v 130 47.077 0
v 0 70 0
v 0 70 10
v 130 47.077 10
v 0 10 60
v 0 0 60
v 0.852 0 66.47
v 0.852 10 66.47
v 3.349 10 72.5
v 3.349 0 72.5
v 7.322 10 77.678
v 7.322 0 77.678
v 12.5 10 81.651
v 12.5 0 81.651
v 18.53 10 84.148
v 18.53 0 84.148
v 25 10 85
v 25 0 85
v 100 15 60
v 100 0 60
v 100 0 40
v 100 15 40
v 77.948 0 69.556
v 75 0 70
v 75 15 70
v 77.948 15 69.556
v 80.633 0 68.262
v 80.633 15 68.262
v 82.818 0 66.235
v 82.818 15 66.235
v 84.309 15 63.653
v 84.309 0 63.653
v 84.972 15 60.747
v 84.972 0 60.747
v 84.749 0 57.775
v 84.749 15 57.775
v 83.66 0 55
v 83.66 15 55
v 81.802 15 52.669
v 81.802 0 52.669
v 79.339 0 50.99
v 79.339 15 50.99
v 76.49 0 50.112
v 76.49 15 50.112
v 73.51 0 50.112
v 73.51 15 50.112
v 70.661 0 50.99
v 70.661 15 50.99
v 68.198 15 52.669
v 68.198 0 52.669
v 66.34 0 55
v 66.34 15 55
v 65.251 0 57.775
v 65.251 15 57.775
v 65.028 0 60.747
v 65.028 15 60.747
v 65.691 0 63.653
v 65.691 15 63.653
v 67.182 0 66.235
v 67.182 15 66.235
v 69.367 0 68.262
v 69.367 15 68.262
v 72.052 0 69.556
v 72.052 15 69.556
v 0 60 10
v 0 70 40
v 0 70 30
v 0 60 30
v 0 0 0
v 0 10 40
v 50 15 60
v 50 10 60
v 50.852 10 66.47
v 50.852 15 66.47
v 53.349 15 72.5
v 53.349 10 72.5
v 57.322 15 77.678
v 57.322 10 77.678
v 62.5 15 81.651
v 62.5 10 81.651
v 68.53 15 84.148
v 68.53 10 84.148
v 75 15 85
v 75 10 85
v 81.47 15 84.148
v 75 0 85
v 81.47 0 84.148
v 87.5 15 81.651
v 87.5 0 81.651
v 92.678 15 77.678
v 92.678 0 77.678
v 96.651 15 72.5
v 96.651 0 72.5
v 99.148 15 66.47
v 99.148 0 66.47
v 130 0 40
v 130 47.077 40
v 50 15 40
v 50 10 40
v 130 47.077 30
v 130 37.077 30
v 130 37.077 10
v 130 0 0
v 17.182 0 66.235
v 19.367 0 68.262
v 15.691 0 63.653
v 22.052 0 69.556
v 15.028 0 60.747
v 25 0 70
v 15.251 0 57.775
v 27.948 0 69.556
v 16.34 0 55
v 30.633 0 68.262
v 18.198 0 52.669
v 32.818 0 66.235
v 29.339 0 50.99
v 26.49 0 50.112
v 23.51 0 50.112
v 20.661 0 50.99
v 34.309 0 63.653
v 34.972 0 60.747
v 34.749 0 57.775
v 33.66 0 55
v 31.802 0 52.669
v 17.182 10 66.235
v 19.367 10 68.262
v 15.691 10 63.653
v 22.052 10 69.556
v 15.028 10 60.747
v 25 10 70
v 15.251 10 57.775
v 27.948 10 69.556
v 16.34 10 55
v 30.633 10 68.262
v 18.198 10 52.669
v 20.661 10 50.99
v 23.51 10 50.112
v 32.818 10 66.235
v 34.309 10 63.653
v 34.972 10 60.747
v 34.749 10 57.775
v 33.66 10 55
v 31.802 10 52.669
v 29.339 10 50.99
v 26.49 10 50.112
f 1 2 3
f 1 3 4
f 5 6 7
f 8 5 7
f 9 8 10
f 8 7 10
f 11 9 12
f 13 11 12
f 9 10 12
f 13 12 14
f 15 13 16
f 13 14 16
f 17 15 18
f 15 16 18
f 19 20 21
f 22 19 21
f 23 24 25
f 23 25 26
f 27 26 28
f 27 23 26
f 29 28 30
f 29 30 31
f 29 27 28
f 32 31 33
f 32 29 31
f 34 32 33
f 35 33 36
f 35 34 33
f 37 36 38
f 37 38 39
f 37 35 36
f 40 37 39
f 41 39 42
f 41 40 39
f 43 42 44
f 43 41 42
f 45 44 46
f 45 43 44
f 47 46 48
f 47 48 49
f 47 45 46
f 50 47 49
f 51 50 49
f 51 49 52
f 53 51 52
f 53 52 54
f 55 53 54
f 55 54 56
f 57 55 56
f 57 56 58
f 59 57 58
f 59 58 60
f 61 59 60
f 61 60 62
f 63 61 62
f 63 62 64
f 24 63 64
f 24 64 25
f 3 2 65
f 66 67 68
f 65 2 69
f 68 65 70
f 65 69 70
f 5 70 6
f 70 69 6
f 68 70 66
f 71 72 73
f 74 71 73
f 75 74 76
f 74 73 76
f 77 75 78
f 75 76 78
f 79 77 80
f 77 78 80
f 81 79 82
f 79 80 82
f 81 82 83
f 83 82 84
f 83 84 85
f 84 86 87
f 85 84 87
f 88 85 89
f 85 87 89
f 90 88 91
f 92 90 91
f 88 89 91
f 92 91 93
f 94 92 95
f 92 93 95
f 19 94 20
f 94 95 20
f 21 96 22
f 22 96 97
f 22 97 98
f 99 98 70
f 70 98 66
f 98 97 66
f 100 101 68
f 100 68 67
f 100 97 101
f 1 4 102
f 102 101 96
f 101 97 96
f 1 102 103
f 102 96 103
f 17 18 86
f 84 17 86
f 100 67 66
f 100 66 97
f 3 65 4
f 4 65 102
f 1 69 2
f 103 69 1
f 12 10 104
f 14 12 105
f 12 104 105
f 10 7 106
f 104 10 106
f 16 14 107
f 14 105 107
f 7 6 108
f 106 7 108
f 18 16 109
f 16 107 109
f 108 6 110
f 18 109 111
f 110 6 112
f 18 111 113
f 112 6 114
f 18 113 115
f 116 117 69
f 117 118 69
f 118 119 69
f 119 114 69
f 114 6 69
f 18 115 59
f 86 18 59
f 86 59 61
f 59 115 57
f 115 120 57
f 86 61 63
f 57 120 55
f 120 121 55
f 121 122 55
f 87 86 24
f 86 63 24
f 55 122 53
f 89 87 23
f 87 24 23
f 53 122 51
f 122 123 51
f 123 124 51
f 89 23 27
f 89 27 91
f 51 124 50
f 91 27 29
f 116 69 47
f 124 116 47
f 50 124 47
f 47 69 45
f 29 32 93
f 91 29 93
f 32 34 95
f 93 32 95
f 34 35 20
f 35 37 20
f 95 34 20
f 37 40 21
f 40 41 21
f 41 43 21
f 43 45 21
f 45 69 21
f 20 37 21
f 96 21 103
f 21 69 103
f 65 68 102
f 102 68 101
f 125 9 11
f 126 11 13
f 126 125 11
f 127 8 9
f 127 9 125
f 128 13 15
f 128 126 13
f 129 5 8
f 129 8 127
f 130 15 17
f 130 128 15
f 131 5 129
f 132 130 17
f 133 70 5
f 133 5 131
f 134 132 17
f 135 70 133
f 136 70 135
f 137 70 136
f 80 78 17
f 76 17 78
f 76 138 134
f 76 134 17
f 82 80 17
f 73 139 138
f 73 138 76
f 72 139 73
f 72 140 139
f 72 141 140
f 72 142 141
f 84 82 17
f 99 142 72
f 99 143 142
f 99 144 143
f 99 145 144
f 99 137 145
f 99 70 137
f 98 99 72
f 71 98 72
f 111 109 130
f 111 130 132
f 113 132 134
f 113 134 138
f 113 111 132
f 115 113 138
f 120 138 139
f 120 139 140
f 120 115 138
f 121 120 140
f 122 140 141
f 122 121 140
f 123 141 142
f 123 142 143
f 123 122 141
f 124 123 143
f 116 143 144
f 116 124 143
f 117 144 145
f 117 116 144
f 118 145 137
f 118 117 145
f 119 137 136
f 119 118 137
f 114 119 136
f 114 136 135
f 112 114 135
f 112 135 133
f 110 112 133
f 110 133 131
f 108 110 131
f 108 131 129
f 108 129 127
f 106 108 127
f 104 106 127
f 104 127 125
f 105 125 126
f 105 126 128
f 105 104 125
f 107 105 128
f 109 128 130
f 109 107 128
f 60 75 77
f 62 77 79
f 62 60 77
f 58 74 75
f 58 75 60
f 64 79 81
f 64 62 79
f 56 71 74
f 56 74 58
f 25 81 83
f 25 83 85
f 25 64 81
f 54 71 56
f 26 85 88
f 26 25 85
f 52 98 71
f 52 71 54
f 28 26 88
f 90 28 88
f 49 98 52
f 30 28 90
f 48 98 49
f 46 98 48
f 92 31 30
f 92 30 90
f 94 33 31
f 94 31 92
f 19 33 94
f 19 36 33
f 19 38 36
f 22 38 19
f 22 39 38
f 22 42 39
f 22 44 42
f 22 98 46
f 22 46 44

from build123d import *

# Parameters (mm, degrees)
SKETCH_1_W               = 130
SKETCH_1_H               = 10
EXTRUDE_1_DEPTH          = 70
EXTRUDE_1_2_DEPTH        = 70
SKETCH_1_3_W             = 130
SKETCH_1_3_H             = 20
EXTRUDE_2_DEPTH          = 60
SKETCH_3_W               = 20
SKETCH_3_H               = 22.922507492
CUT_EXTRUDE_4_DEPTH      = 130
CUT_EXTRUDE_5_DEPTH      = 153.970585408
CUT_EXTRUDE_5_DEPTH_BACK = 153.970585408
EXTRUDE_3_DEPTH          = 30
SKETCH_1_4_R             = 10
EXTRUDE_4_DEPTH          = 10
SKETCH_1_5_R             = 10
EXTRUDE_5_DEPTH          = 15


with BuildPart() as part:
    # 스케치1 → 보스-돌출1 (new body)
    with BuildSketch(Plane(origin=(0, 0, 0), x_dir=(1, 0, 0), z_dir=(0, 1, 0))):
        with Locations((65, -5)):
            Rectangle(SKETCH_1_W, SKETCH_1_H)
    extrude(amount=EXTRUDE_1_DEPTH)



with BuildPart() as body_2:
    # 스케치1 → Extrude 1 2 (new body)
    with BuildSketch(Plane(origin=(0, 0, 0), x_dir=(1, 0, 0), z_dir=(0, 1, 0))):
        with Locations((65, -35)):
            Rectangle(SKETCH_1_W, SKETCH_1_H)
    extrude(amount=EXTRUDE_1_2_DEPTH)


with BuildPart() as part_1:
    add(part.part)

    add(body_2.part)  # 보스-돌출2 merges body 2
    # 스케치1<3> → 보스-돌출2 (add)
    with BuildSketch(Plane(origin=(0, 0, 0), x_dir=(1, 0, 0), z_dir=(0, 1, 0))):
        with Locations((65, -20)):
            Rectangle(SKETCH_1_3_W, SKETCH_1_3_H)
    extrude(amount=EXTRUDE_2_DEPTH)

    # 스케치3 → 컷-돌출4 (cut)
    with BuildSketch(Plane(origin=(130, 0, 0), x_dir=(0, 0, -1), z_dir=(1, 0, 0))):
        with Locations((-20, 48.538746254)):
            Rectangle(SKETCH_3_W, SKETCH_3_H)
    extrude(amount=-CUT_EXTRUDE_4_DEPTH, mode=Mode.SUBTRACT)

    # 스케치2 → 컷-돌출5 (cut, two sides: drawn at the far end of the back side and taken through both)
    with BuildSketch(Plane.XY.offset(40).offset(-CUT_EXTRUDE_5_DEPTH_BACK)):
        Polygon((130, 70), (0, 70), (130, 47.077492508), align=None)
    extrude(amount=CUT_EXTRUDE_5_DEPTH + CUT_EXTRUDE_5_DEPTH_BACK, mode=Mode.SUBTRACT)

    # 스케치4 → 보스-돌출3 (add)
    with BuildSketch(Plane.XY.offset(40)):
        Polygon((130, 37.077492508), (0, 37.077492508), (0, 60), align=None)
    extrude(amount=-EXTRUDE_3_DEPTH)

    # 스케치1<4> → 보스-돌출4 (add)
    # profile 1 of 2: a face of its own
    with BuildSketch(Plane(origin=(0, 0, 0), x_dir=(1, 0, 0), z_dir=(0, 1, 0))):
        with BuildLine():
            Line((50, -40), (0, -40))
            Line((0, -40), (0, -60))
            ThreePointArc((0, -60), (7.32233047, -77.67766953), (25, -85))
            Line((25, -85), (75, -85))
            ThreePointArc((75, -85), (57.32233047, -77.67766953), (50, -60))
            Line((50, -60), (50, -40))
        make_face()
        with Locations(Location((25, -60, 0), (0, 0, 270))):
            Circle(SKETCH_1_4_R, mode=Mode.SUBTRACT)
    # profile 2 of 2: a face of its own
    with BuildSketch(Plane(origin=(0, 0, 0), x_dir=(1, 0, 0), z_dir=(0, 1, 0))):
        with BuildLine():
            Line((100, -40), (50, -40))
            Line((50, -40), (50, -60))
            ThreePointArc((50, -60), (57.32233047, -77.67766953), (75, -85))
            ThreePointArc((75, -85), (92.67766953, -77.67766953), (100, -60))
            Line((100, -60), (100, -40))
        make_face()
        with Locations(Location((75, -60, 0), (0, 0, 270))):
            Circle(SKETCH_1_4_R, mode=Mode.SUBTRACT)
    extrude(amount=EXTRUDE_4_DEPTH)

    # 스케치1<5> → 보스-돌출5 (add)
    with BuildSketch(Plane(origin=(0, 0, 0), x_dir=(1, 0, 0), z_dir=(0, 1, 0))):
        with BuildLine():
            Line((100, -40), (50, -40))
            Line((50, -40), (50, -60))
            ThreePointArc((50, -60), (57.32233047, -77.67766953), (75, -85))
            ThreePointArc((75, -85), (92.67766953, -77.67766953), (100, -60))
            Line((100, -60), (100, -40))
        make_face()
        with Locations(Location((75, -60, 0), (0, 0, 270))):
            Circle(SKETCH_1_5_R, mode=Mode.SUBTRACT)
    extrude(amount=EXTRUDE_5_DEPTH)


solid = part_1.part
